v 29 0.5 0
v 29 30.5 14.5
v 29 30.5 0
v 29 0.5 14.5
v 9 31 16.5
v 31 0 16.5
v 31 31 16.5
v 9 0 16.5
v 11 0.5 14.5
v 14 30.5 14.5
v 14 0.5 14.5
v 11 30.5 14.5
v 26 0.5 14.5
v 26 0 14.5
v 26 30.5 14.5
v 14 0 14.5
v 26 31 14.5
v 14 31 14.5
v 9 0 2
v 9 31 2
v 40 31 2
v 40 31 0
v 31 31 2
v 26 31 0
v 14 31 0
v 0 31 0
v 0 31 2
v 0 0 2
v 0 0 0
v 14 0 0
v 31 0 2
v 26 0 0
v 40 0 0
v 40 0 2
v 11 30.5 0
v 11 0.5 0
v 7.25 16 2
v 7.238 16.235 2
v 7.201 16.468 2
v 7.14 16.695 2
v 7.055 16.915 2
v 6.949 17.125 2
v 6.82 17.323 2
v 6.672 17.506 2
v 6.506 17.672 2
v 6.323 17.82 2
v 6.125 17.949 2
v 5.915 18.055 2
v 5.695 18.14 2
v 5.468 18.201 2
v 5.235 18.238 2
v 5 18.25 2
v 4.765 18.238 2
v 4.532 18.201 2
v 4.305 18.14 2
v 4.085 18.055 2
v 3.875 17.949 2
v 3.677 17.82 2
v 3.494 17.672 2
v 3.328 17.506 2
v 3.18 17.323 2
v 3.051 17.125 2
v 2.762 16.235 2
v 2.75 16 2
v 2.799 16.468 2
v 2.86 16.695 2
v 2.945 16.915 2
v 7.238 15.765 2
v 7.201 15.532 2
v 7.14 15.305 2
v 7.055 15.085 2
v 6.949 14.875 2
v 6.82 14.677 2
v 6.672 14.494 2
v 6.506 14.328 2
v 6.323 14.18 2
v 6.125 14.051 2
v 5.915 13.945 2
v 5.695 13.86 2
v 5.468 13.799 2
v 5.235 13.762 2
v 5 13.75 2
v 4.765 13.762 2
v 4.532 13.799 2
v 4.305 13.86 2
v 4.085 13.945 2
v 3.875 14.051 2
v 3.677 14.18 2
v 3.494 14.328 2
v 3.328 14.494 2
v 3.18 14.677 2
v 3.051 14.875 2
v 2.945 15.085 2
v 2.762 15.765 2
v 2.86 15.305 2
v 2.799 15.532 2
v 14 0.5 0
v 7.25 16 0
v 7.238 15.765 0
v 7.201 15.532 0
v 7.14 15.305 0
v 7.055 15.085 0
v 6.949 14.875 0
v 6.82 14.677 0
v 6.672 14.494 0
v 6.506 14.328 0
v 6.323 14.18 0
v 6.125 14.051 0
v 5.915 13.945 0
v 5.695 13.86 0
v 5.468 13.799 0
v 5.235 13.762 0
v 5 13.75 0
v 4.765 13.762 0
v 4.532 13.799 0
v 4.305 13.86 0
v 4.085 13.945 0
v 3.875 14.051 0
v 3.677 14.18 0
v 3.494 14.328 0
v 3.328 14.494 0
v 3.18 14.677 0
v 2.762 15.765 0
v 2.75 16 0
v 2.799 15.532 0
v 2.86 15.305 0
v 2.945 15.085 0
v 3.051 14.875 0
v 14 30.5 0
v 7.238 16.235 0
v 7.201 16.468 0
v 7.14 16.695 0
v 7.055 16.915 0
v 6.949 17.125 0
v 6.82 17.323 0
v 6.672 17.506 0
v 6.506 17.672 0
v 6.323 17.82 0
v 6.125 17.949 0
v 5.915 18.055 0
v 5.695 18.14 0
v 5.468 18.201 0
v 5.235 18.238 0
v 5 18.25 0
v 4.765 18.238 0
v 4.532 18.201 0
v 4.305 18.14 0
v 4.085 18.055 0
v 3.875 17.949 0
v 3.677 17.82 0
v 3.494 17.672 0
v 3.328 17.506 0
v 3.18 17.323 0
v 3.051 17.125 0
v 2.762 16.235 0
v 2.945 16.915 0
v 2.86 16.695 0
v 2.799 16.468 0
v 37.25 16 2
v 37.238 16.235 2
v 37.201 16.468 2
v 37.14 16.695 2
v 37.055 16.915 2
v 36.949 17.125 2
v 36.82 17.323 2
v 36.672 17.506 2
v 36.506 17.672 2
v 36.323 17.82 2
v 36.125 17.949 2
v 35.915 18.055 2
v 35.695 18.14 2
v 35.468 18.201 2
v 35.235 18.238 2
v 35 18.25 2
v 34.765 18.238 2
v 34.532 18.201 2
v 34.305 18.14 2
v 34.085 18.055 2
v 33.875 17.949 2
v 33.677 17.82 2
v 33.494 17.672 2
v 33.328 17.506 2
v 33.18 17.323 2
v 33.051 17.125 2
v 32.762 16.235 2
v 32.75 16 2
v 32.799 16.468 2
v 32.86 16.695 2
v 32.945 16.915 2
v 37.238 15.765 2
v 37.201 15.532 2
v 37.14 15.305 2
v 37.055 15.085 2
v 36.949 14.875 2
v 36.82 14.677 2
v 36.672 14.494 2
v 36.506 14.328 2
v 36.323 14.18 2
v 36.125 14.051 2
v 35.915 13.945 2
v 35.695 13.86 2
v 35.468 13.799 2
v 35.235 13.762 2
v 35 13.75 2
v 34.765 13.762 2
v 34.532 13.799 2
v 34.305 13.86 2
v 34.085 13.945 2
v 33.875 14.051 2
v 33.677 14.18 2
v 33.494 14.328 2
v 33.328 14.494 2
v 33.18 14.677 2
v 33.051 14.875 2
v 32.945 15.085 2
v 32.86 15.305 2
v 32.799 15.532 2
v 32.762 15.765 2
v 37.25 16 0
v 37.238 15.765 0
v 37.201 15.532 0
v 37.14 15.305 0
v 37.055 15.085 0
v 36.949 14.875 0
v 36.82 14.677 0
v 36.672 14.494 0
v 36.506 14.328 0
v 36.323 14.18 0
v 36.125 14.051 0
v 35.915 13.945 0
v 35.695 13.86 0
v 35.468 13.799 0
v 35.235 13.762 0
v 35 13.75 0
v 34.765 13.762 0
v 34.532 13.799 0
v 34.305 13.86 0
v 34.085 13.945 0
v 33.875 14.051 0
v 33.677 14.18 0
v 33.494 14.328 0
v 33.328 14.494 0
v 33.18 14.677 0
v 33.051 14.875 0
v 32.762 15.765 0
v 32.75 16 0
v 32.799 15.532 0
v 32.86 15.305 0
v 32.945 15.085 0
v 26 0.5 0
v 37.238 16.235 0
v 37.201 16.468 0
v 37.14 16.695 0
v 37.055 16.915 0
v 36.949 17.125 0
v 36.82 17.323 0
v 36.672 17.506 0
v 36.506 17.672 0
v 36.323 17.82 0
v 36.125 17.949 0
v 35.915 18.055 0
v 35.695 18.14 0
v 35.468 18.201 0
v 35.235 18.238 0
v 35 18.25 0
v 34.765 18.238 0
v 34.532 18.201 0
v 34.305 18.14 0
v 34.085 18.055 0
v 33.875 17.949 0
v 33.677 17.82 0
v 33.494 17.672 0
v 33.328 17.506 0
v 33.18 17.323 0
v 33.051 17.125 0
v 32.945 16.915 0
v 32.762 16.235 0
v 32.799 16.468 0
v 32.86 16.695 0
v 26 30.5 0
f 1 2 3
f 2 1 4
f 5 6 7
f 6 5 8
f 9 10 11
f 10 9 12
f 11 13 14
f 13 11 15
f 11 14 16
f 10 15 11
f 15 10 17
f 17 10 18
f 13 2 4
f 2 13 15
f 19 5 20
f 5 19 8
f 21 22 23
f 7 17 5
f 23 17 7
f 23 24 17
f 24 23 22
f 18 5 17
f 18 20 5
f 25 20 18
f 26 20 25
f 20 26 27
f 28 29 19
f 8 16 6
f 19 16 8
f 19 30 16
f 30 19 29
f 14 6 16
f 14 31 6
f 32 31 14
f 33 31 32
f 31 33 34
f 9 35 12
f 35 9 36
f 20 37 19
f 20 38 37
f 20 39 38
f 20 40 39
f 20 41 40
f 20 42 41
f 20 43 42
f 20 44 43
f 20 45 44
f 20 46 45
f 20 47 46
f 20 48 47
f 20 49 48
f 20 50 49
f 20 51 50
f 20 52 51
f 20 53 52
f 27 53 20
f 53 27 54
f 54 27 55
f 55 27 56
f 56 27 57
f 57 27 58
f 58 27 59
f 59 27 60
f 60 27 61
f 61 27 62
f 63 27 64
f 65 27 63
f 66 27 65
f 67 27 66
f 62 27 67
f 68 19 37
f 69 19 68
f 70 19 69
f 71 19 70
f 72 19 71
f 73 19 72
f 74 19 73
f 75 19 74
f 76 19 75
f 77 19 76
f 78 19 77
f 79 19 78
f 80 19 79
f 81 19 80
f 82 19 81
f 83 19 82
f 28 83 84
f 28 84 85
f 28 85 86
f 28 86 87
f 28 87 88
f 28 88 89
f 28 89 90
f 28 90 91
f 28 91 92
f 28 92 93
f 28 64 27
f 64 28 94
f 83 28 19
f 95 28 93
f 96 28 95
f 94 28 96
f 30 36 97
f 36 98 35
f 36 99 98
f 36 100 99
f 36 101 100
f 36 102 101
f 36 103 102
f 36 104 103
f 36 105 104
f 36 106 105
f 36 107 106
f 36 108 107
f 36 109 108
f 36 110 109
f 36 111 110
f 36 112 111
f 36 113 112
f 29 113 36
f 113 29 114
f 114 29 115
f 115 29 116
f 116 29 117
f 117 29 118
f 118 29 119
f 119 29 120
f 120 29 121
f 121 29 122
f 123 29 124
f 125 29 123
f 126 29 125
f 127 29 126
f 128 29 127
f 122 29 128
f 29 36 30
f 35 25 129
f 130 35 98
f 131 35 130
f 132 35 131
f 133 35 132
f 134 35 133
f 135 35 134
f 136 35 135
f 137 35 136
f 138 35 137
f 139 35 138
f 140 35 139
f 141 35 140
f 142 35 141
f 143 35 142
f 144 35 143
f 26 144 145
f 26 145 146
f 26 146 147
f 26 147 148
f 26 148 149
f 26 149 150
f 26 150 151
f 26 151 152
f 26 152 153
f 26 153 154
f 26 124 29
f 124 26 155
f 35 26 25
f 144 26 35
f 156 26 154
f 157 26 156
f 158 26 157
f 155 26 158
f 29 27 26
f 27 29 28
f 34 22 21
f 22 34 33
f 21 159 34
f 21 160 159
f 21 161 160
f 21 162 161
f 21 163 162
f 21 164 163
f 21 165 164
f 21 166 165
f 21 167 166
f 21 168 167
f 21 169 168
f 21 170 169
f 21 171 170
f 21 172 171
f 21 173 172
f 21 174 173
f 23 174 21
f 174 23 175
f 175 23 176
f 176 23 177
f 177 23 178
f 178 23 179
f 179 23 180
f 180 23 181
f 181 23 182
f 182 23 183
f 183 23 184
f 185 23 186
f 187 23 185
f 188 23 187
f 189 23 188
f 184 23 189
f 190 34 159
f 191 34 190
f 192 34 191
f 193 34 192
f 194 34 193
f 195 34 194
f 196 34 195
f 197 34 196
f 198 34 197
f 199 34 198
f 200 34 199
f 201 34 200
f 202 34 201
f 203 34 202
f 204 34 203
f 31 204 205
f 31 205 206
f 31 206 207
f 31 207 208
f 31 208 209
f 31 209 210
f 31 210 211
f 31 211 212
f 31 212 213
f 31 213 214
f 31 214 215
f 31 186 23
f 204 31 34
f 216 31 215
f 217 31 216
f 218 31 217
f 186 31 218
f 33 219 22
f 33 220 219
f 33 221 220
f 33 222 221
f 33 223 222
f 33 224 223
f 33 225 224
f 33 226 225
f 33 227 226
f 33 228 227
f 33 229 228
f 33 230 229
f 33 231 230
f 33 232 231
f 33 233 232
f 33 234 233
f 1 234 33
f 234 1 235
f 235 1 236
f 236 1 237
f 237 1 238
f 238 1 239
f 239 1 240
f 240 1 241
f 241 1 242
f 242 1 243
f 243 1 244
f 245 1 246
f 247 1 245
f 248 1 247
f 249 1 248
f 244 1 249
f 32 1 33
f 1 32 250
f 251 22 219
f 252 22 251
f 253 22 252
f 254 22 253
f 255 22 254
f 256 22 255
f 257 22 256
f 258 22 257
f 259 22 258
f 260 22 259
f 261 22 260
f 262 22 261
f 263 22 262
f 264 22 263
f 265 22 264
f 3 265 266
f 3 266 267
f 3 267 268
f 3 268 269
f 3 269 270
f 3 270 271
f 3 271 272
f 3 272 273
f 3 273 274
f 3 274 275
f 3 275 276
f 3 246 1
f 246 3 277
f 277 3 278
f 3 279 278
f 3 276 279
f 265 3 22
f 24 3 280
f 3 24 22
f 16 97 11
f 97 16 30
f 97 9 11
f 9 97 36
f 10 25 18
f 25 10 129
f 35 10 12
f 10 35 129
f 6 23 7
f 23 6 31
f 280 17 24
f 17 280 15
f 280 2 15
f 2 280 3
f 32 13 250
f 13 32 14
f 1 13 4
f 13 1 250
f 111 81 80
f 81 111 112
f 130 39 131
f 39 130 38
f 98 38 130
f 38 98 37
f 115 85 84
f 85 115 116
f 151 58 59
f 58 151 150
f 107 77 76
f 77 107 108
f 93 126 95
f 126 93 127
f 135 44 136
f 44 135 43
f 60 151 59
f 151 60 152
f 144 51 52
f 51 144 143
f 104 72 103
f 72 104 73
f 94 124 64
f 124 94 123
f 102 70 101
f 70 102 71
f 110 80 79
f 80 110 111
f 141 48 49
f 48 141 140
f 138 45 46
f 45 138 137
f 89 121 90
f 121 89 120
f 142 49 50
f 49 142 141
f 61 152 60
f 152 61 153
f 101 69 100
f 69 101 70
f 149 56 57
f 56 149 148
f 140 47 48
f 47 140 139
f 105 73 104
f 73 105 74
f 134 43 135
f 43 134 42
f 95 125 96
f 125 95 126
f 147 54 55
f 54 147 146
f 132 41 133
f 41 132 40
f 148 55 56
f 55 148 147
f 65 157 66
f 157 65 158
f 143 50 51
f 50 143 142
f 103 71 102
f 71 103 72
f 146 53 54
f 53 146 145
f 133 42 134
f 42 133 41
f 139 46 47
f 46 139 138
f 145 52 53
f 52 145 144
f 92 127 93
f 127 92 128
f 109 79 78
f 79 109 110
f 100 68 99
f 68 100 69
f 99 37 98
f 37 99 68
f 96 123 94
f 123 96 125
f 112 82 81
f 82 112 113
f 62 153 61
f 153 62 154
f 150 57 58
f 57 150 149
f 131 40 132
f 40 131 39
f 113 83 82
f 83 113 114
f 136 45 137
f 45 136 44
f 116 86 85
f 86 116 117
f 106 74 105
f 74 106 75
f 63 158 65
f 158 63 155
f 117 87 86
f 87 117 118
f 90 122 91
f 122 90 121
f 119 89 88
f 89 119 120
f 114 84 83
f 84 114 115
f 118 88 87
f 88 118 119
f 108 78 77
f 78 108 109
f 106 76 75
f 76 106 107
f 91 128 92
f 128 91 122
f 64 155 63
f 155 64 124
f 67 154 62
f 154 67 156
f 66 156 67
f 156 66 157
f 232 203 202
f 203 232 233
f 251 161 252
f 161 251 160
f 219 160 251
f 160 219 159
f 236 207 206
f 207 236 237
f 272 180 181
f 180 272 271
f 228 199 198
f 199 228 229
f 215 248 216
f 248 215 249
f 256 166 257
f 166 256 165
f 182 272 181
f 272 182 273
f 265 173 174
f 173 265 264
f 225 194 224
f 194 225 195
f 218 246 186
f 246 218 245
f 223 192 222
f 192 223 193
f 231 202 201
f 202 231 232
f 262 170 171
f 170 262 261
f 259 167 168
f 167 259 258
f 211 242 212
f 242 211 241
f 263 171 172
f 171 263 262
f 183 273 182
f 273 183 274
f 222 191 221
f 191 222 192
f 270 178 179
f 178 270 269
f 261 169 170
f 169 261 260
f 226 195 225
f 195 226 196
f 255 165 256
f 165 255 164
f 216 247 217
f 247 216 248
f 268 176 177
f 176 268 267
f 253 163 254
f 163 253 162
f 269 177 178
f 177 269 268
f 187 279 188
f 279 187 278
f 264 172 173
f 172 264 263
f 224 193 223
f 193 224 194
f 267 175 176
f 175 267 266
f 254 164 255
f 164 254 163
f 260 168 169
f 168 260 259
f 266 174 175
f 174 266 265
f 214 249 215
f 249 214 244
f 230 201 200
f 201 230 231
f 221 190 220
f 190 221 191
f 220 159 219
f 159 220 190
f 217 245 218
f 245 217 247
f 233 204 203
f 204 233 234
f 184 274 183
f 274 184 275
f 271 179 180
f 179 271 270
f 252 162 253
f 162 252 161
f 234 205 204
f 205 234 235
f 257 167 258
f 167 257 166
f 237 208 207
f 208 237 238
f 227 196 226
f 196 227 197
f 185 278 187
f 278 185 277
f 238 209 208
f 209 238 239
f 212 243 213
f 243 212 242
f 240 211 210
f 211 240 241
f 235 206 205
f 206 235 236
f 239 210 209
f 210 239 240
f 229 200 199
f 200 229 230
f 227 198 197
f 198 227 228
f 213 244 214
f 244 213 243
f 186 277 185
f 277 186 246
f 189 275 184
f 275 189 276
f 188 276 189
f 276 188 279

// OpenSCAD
// U Bracket - Corrected version for Tinkercad / OpenSCAD 
// Dimensions in mm

difference() {
    // Main solid U-shape
    union() {
        // Middle raised section
        translate([9, 0, 14.5])
            cube([20, 31, 2], center = false);
        // Left flange
        cube([11, 31, 2], center = false);
        // Right flange
        translate([29, 0, 0])
            cube([11, 31, 2], center = false);
        // Side walls connecting to middle
        translate([9, 0, 2])
            cube([2, 31, 14.5], center = false);
        translate([9, 0, 0])
            cube([5, 0.5, 14.5], center = false);
        translate([9, 30.5, 0])
            cube([5, 0.5, 14.5], center = false);
        translate([26, 30.5, 0])
            cube([5, 0.5, 14.5], center = false);
        translate([26, 0, 0])
            cube([5, 0.5, 14.5], center = false);
        translate([29, 0, 2])
            cube([2, 31, 14.5], center = false);
    }

    // Holes for M4 bolts (Ø4.5 mm)
    translate([5, 16, 1])
        cylinder(h = 4, r = 2.25, center = true, $fn = 60);
    translate([35, 16, 1])
        cylinder(h = 4, r = 2.25, center = true, $fn = 60);
}
